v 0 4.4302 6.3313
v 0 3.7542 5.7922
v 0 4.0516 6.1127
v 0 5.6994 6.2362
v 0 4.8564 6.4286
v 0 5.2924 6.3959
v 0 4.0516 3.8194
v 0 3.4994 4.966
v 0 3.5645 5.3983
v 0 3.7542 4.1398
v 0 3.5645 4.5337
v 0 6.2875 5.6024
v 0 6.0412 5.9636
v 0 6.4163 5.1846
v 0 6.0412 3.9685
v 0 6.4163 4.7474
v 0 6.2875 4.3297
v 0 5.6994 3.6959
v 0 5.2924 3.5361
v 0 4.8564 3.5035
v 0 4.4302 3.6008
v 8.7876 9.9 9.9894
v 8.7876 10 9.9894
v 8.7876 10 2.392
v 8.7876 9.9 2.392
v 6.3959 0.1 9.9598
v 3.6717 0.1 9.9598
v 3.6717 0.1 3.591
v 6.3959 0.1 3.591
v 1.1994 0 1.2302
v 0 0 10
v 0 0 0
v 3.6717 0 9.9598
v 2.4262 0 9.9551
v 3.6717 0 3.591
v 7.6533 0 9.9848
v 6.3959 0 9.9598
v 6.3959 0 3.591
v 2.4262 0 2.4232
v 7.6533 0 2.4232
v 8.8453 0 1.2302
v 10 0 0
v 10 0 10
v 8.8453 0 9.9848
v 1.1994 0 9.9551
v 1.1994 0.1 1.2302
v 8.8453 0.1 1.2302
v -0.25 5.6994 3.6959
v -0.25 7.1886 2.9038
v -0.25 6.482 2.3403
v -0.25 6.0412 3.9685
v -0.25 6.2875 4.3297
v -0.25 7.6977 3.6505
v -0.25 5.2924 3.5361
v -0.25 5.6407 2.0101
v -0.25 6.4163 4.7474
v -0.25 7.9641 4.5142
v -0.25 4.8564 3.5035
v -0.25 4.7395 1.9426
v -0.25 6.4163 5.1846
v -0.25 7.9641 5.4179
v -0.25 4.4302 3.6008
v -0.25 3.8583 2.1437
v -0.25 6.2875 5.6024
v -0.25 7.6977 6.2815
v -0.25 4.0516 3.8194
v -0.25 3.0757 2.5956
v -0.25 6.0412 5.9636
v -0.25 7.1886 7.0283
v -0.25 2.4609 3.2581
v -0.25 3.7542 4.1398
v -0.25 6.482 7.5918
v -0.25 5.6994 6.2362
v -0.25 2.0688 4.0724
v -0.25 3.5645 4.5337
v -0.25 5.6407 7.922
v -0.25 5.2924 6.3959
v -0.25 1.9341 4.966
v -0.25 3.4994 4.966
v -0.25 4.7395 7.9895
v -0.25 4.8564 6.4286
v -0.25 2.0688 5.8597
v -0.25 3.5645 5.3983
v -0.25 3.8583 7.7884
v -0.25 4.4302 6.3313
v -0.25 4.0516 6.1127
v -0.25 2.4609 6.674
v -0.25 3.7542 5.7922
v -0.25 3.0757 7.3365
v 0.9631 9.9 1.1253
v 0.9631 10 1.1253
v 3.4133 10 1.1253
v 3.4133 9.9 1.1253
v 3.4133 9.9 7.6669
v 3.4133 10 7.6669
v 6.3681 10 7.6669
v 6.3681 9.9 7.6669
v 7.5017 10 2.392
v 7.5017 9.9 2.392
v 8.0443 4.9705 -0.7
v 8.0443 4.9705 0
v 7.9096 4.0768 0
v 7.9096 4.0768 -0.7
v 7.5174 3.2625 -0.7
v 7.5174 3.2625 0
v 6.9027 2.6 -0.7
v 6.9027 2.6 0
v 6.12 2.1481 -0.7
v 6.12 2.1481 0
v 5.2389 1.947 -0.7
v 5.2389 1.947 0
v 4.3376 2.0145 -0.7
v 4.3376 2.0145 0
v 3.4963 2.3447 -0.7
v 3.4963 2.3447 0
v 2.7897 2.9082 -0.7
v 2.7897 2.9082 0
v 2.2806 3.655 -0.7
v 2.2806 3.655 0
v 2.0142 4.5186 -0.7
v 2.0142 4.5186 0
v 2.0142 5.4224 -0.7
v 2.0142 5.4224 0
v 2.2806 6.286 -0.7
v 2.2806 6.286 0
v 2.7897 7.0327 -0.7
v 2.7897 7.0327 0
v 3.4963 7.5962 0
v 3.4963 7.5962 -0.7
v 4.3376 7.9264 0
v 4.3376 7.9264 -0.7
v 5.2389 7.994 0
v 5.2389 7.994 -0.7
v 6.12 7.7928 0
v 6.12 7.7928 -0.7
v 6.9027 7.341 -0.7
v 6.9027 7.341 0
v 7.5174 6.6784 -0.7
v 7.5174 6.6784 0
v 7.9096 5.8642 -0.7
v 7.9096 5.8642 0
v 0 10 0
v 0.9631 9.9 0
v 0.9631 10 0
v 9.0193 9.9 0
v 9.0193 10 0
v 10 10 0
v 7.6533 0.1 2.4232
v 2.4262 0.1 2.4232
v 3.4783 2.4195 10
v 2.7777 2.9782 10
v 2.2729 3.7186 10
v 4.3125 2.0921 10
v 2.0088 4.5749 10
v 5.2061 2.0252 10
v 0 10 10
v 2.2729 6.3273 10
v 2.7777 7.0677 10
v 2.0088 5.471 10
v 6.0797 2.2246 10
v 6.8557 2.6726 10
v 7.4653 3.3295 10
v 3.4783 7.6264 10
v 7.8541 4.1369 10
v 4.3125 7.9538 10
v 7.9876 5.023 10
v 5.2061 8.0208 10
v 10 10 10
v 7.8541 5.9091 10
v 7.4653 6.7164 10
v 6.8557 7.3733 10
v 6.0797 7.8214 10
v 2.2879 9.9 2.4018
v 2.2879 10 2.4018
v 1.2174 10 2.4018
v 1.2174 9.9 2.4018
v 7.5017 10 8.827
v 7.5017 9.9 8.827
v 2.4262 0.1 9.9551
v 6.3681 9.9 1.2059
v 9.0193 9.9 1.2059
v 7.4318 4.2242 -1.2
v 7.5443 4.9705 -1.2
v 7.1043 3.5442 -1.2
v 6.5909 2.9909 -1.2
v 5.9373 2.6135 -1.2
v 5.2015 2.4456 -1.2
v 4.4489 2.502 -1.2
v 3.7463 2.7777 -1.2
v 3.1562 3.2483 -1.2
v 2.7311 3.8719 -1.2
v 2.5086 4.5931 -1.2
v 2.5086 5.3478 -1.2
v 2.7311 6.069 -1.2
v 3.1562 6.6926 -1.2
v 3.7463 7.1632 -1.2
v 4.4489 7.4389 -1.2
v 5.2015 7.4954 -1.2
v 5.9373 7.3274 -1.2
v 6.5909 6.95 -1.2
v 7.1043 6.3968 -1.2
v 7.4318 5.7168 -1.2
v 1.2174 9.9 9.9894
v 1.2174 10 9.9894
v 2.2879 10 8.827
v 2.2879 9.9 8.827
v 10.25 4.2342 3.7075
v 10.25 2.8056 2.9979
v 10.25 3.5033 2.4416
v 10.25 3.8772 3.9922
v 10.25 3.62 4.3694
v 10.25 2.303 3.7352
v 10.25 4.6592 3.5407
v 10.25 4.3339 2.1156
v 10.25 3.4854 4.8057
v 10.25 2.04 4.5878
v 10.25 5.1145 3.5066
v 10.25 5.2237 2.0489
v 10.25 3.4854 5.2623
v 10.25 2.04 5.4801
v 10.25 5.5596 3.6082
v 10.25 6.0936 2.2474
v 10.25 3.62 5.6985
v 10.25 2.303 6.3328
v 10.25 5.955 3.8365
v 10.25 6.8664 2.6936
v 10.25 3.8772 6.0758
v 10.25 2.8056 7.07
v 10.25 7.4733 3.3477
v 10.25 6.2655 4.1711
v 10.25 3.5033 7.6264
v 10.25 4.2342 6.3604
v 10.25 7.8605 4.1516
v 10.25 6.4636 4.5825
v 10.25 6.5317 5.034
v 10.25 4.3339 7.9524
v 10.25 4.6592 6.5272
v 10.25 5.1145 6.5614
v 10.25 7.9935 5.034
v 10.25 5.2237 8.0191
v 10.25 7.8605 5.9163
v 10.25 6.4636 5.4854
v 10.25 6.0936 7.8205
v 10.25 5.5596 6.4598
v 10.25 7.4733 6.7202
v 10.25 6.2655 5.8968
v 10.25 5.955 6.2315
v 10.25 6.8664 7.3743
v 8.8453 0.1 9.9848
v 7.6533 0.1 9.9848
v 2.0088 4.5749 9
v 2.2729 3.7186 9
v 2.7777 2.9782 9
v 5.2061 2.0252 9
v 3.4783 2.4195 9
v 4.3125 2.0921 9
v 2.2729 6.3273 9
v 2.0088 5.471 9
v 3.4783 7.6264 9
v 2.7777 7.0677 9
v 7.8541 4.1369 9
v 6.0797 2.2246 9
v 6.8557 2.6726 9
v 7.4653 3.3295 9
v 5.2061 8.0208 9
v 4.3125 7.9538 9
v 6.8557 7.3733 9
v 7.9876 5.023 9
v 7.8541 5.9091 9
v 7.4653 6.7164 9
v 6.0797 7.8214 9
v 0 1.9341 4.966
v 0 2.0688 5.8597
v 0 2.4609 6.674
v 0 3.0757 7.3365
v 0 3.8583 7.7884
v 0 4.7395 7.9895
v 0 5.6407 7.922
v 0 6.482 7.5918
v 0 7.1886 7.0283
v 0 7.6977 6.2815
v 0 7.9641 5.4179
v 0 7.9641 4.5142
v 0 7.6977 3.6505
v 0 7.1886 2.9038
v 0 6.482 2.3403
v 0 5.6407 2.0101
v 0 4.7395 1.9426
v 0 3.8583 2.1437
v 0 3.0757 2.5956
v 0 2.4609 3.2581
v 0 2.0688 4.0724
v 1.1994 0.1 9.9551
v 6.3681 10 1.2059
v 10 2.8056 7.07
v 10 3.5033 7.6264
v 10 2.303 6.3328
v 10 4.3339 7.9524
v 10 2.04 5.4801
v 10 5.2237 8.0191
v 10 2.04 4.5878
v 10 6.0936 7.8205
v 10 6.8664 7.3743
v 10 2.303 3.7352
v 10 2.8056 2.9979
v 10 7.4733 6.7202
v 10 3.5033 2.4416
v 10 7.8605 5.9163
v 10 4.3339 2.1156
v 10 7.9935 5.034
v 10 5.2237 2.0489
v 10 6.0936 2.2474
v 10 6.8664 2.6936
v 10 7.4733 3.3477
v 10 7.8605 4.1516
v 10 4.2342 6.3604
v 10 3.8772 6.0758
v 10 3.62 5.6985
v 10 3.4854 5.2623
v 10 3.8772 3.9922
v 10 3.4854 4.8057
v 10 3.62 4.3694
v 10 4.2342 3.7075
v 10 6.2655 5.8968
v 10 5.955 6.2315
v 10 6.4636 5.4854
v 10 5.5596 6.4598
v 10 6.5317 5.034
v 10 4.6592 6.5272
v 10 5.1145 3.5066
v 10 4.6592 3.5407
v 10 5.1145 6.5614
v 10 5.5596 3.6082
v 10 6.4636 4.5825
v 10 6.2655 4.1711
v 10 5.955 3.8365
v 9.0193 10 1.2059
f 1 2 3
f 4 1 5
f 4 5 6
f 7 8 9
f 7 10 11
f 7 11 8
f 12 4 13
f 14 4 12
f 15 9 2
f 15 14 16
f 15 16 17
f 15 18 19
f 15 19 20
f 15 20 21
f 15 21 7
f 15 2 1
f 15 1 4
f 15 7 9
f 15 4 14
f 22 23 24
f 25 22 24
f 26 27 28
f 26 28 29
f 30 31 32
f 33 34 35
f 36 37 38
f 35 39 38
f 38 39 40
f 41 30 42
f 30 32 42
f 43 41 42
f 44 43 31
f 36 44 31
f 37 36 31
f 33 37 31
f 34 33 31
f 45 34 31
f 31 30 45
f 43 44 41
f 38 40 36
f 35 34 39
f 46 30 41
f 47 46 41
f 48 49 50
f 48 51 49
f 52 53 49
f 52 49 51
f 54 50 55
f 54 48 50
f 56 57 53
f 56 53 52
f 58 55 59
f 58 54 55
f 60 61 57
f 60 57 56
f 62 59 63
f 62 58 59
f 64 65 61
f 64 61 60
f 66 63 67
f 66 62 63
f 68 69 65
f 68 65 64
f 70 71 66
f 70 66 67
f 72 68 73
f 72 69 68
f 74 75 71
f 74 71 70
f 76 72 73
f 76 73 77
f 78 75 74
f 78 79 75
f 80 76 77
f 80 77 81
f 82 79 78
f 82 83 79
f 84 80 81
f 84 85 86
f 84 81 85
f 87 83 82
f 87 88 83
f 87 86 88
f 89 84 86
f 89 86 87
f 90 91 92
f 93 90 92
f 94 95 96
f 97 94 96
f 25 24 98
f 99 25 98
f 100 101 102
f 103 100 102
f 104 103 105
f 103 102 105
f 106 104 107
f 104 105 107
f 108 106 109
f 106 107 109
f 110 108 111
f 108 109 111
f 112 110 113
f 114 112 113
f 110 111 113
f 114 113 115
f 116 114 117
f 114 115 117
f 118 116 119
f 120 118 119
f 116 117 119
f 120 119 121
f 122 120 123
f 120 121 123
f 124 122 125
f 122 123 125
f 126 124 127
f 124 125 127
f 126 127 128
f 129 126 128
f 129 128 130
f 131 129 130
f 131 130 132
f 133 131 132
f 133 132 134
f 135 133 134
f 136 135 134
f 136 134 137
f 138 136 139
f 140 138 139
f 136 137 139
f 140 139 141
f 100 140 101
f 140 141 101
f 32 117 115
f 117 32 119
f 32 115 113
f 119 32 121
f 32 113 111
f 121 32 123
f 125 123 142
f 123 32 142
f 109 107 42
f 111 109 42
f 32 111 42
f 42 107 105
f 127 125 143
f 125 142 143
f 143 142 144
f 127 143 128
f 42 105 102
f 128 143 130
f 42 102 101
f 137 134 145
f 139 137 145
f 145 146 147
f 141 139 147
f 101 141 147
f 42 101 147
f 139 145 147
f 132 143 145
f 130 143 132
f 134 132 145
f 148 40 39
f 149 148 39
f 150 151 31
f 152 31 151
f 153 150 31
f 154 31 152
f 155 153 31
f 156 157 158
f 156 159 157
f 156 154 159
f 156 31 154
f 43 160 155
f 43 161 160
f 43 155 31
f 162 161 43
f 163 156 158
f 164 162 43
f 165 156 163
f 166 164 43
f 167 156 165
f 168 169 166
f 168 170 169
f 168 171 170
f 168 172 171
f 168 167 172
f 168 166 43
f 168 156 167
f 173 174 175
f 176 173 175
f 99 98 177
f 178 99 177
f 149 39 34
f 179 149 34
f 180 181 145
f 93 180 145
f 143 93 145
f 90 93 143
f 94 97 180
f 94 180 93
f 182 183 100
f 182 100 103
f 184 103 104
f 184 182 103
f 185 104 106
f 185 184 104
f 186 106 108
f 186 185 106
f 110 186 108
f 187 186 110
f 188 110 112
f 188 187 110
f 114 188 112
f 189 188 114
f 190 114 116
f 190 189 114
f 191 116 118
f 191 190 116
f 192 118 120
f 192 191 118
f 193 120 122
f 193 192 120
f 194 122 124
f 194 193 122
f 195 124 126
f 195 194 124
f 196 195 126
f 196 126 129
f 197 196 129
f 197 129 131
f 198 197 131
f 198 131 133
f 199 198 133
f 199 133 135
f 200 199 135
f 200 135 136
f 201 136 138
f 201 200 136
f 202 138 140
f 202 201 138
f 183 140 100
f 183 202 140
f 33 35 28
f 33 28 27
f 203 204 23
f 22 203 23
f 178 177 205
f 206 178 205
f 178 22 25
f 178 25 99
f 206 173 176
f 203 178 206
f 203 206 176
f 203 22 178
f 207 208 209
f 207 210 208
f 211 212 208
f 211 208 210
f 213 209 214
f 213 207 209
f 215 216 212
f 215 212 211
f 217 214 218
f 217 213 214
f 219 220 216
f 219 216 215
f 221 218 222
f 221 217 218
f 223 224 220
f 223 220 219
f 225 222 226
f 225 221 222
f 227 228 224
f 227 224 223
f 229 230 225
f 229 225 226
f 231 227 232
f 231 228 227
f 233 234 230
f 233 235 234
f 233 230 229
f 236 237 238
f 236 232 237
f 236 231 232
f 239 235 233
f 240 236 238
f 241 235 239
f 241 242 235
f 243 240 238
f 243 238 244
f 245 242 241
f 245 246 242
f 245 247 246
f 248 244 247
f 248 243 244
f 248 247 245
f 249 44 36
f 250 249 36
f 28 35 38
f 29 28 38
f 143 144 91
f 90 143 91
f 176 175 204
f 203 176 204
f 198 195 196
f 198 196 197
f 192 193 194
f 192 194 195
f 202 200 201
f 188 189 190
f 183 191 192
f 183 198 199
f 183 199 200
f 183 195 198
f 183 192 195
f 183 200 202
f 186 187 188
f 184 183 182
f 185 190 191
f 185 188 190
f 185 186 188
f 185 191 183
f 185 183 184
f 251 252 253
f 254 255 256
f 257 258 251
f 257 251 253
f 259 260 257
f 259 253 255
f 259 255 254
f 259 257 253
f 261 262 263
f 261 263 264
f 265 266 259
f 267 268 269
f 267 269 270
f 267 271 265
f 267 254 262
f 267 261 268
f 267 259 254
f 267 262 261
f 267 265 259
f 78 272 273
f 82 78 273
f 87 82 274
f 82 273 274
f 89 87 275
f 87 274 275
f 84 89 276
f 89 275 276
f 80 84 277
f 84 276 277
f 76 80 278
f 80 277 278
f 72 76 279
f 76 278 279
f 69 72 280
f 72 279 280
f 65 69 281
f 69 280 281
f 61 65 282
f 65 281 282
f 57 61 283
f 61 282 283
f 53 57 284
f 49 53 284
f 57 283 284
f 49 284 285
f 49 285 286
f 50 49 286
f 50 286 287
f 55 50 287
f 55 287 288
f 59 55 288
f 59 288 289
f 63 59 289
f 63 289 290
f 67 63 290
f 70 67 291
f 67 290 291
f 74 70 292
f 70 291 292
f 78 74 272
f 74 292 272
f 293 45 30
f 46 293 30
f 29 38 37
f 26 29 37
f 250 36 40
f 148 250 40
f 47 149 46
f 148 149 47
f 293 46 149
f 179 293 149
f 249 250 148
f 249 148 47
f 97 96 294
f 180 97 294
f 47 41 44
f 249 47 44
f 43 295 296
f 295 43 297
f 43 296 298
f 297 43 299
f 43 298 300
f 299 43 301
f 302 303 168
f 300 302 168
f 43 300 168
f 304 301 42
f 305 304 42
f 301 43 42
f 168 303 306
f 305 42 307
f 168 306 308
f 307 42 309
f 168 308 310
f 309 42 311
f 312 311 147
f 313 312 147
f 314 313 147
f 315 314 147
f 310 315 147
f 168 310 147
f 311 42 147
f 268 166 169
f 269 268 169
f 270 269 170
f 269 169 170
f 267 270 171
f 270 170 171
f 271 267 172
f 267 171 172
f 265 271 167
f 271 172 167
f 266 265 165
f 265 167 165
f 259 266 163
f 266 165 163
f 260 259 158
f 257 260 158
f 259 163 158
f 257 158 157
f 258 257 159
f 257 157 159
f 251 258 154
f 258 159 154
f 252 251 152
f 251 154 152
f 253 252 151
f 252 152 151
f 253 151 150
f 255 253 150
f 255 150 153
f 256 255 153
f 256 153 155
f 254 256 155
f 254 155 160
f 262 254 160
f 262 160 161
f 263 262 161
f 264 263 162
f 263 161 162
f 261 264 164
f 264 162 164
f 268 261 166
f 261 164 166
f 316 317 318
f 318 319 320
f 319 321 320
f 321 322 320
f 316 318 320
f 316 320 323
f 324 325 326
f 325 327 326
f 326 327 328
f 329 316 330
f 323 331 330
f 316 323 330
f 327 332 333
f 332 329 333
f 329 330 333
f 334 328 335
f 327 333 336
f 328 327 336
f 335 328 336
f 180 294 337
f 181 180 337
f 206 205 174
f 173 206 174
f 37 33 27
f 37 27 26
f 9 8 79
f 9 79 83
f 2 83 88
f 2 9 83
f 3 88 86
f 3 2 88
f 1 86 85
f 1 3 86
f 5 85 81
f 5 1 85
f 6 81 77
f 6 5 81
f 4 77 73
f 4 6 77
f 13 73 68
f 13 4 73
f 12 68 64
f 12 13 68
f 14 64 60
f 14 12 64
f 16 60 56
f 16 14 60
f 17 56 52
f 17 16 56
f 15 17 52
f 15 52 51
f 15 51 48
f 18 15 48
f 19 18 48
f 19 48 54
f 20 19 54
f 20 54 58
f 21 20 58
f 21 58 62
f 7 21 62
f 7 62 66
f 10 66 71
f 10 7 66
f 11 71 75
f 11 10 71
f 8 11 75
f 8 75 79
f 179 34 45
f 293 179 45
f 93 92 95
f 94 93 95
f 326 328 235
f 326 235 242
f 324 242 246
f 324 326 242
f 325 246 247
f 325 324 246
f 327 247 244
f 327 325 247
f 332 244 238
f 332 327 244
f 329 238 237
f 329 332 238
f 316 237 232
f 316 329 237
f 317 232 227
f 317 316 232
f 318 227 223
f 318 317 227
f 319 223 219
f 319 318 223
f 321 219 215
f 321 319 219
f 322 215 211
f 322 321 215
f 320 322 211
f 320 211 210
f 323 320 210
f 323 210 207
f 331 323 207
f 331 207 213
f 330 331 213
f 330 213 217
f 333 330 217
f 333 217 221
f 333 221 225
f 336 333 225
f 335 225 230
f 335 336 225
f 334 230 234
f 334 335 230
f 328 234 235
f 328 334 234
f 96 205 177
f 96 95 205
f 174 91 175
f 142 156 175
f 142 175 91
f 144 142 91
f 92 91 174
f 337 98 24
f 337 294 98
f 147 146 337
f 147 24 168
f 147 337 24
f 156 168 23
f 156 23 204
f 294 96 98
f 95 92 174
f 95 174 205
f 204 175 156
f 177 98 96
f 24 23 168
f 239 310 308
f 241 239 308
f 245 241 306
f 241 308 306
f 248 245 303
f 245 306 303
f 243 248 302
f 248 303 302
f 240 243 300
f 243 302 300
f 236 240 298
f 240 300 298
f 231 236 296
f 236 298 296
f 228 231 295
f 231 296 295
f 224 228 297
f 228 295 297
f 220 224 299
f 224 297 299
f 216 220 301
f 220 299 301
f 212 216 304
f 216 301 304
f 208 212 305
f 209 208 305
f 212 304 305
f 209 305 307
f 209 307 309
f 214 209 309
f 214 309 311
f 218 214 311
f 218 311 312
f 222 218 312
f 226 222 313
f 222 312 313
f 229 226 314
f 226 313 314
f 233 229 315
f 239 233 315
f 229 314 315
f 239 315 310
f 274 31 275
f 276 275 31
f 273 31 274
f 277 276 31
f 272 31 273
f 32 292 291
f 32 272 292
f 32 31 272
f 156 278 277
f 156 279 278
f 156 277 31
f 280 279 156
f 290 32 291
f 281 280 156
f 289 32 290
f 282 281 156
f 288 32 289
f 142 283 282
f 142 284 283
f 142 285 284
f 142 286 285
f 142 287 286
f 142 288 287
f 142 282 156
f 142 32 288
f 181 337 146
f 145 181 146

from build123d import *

# Parameters (mm, degrees)
BOX_W           = 10
BOX_H           = 10
BOX_DEPTH       = 10
SKETCH_R        = 3.031933
SKETCH_R_2      = 1.466661
PAD_DEPTH       = 0.25
SKETCH001_R     = 2.993457
SKETCH001_R_2   = 1.531672
PAD001_DEPTH    = 0.25
SKETCH002_W     = 2.724157
SKETCH002_H     = 6.368804
POCKET_DEPTH    = 0.1
POCKET001_DEPTH = 0.1
SKETCH004_R     = 3.031957
PAD002_DEPTH    = 1.2
CHAMFER_SIZE    = 0.5
SKETCH005_R     = 3.00622
POCKET002_DEPTH = 1


with BuildPart() as part:
    # Box → Box (new body)
    with BuildSketch(Plane.XY):
        with Locations((5, 5)):
            Rectangle(BOX_W, BOX_H)
    extrude(amount=BOX_DEPTH)

    # Sketch → Pad (new body)
    with BuildSketch(Plane(origin=(0, 0, 0), x_dir=(0, -1, 0), z_dir=(-1, 0, 0))):
        with Locations((-4.966039, 4.966038)):
            Circle(SKETCH_R)
        with Locations((-4.966039, 4.966038)):
            Circle(SKETCH_R_2, mode=Mode.SUBTRACT)
    extrude(amount=PAD_DEPTH)

    # Sketch001 → Pad001 (new body)
    with BuildSketch(Plane.YZ.offset(10)):
        with Locations((5, 5.033968)):
            Circle(SKETCH001_R)
        with Locations((5, 5.033968)):
            Circle(SKETCH001_R_2, mode=Mode.SUBTRACT)
    extrude(amount=PAD001_DEPTH)

    # Sketch002 → Pocket (cut)
    with BuildSketch(Plane.XZ):
        Polygon((1.199389, 9.955067), (1.199389, 1.230168), (8.845252, 1.230168), (8.845252, 9.984818), (7.653271, 9.984818), (7.653271, 2.423196), (2.426231, 2.423196), (2.426231, 9.955067), align=None)
        with Locations((5.033784, 6.775435)):
            Rectangle(SKETCH002_W, SKETCH002_H)
    extrude(amount=-POCKET_DEPTH, mode=Mode.SUBTRACT)

    # Sketch003 → Pocket001 (cut)
    with BuildSketch(Plane(origin=(0, 10, 0), x_dir=(-1, 0, 0), z_dir=(0, 1, 0))):
        Polygon((-1.217365, 9.989383), (-8.787637, 9.989383), (-8.787637, 2.392008), (-7.501711, 2.392008), (-7.501711, 8.826966), (-2.287892, 8.826966), (-2.287892, 2.401849), (-1.217365, 2.401849), align=None)
        Polygon((-9.019255, 0), (-0.963062, 0), (-0.963062, 1.125345), (-3.413274, 1.125345), (-3.413274, 7.666882), (-6.368116, 7.666882), (-6.368116, 1.205942), (-9.019255, 1.205942), align=None)
    extrude(amount=-POCKET001_DEPTH, mode=Mode.SUBTRACT)

    # Sketch004 → Pad002 (new body)
    with BuildSketch(Plane(origin=(0, 0, 0), x_dir=(1, 0, 0), z_dir=(0, 0, -1))):
        with Locations((5.012299, -4.970473)):
            Circle(SKETCH004_R)
    extrude(amount=PAD002_DEPTH)

    # Chamfer
    chamfer_edges = [part.edges().sort_by_distance(p)[0] for p in [
        (1.980342, 4.970473, -1.2),
    ]]
    chamfer(chamfer_edges, length=CHAMFER_SIZE)

    # Sketch005 → Pocket002 (cut)
    with BuildSketch(Plane.XY.offset(10)):
        with Locations((4.981398, 5.022974)):
            Circle(SKETCH005_R)
    extrude(amount=-POCKET002_DEPTH, mode=Mode.SUBTRACT)


solid = part.part
